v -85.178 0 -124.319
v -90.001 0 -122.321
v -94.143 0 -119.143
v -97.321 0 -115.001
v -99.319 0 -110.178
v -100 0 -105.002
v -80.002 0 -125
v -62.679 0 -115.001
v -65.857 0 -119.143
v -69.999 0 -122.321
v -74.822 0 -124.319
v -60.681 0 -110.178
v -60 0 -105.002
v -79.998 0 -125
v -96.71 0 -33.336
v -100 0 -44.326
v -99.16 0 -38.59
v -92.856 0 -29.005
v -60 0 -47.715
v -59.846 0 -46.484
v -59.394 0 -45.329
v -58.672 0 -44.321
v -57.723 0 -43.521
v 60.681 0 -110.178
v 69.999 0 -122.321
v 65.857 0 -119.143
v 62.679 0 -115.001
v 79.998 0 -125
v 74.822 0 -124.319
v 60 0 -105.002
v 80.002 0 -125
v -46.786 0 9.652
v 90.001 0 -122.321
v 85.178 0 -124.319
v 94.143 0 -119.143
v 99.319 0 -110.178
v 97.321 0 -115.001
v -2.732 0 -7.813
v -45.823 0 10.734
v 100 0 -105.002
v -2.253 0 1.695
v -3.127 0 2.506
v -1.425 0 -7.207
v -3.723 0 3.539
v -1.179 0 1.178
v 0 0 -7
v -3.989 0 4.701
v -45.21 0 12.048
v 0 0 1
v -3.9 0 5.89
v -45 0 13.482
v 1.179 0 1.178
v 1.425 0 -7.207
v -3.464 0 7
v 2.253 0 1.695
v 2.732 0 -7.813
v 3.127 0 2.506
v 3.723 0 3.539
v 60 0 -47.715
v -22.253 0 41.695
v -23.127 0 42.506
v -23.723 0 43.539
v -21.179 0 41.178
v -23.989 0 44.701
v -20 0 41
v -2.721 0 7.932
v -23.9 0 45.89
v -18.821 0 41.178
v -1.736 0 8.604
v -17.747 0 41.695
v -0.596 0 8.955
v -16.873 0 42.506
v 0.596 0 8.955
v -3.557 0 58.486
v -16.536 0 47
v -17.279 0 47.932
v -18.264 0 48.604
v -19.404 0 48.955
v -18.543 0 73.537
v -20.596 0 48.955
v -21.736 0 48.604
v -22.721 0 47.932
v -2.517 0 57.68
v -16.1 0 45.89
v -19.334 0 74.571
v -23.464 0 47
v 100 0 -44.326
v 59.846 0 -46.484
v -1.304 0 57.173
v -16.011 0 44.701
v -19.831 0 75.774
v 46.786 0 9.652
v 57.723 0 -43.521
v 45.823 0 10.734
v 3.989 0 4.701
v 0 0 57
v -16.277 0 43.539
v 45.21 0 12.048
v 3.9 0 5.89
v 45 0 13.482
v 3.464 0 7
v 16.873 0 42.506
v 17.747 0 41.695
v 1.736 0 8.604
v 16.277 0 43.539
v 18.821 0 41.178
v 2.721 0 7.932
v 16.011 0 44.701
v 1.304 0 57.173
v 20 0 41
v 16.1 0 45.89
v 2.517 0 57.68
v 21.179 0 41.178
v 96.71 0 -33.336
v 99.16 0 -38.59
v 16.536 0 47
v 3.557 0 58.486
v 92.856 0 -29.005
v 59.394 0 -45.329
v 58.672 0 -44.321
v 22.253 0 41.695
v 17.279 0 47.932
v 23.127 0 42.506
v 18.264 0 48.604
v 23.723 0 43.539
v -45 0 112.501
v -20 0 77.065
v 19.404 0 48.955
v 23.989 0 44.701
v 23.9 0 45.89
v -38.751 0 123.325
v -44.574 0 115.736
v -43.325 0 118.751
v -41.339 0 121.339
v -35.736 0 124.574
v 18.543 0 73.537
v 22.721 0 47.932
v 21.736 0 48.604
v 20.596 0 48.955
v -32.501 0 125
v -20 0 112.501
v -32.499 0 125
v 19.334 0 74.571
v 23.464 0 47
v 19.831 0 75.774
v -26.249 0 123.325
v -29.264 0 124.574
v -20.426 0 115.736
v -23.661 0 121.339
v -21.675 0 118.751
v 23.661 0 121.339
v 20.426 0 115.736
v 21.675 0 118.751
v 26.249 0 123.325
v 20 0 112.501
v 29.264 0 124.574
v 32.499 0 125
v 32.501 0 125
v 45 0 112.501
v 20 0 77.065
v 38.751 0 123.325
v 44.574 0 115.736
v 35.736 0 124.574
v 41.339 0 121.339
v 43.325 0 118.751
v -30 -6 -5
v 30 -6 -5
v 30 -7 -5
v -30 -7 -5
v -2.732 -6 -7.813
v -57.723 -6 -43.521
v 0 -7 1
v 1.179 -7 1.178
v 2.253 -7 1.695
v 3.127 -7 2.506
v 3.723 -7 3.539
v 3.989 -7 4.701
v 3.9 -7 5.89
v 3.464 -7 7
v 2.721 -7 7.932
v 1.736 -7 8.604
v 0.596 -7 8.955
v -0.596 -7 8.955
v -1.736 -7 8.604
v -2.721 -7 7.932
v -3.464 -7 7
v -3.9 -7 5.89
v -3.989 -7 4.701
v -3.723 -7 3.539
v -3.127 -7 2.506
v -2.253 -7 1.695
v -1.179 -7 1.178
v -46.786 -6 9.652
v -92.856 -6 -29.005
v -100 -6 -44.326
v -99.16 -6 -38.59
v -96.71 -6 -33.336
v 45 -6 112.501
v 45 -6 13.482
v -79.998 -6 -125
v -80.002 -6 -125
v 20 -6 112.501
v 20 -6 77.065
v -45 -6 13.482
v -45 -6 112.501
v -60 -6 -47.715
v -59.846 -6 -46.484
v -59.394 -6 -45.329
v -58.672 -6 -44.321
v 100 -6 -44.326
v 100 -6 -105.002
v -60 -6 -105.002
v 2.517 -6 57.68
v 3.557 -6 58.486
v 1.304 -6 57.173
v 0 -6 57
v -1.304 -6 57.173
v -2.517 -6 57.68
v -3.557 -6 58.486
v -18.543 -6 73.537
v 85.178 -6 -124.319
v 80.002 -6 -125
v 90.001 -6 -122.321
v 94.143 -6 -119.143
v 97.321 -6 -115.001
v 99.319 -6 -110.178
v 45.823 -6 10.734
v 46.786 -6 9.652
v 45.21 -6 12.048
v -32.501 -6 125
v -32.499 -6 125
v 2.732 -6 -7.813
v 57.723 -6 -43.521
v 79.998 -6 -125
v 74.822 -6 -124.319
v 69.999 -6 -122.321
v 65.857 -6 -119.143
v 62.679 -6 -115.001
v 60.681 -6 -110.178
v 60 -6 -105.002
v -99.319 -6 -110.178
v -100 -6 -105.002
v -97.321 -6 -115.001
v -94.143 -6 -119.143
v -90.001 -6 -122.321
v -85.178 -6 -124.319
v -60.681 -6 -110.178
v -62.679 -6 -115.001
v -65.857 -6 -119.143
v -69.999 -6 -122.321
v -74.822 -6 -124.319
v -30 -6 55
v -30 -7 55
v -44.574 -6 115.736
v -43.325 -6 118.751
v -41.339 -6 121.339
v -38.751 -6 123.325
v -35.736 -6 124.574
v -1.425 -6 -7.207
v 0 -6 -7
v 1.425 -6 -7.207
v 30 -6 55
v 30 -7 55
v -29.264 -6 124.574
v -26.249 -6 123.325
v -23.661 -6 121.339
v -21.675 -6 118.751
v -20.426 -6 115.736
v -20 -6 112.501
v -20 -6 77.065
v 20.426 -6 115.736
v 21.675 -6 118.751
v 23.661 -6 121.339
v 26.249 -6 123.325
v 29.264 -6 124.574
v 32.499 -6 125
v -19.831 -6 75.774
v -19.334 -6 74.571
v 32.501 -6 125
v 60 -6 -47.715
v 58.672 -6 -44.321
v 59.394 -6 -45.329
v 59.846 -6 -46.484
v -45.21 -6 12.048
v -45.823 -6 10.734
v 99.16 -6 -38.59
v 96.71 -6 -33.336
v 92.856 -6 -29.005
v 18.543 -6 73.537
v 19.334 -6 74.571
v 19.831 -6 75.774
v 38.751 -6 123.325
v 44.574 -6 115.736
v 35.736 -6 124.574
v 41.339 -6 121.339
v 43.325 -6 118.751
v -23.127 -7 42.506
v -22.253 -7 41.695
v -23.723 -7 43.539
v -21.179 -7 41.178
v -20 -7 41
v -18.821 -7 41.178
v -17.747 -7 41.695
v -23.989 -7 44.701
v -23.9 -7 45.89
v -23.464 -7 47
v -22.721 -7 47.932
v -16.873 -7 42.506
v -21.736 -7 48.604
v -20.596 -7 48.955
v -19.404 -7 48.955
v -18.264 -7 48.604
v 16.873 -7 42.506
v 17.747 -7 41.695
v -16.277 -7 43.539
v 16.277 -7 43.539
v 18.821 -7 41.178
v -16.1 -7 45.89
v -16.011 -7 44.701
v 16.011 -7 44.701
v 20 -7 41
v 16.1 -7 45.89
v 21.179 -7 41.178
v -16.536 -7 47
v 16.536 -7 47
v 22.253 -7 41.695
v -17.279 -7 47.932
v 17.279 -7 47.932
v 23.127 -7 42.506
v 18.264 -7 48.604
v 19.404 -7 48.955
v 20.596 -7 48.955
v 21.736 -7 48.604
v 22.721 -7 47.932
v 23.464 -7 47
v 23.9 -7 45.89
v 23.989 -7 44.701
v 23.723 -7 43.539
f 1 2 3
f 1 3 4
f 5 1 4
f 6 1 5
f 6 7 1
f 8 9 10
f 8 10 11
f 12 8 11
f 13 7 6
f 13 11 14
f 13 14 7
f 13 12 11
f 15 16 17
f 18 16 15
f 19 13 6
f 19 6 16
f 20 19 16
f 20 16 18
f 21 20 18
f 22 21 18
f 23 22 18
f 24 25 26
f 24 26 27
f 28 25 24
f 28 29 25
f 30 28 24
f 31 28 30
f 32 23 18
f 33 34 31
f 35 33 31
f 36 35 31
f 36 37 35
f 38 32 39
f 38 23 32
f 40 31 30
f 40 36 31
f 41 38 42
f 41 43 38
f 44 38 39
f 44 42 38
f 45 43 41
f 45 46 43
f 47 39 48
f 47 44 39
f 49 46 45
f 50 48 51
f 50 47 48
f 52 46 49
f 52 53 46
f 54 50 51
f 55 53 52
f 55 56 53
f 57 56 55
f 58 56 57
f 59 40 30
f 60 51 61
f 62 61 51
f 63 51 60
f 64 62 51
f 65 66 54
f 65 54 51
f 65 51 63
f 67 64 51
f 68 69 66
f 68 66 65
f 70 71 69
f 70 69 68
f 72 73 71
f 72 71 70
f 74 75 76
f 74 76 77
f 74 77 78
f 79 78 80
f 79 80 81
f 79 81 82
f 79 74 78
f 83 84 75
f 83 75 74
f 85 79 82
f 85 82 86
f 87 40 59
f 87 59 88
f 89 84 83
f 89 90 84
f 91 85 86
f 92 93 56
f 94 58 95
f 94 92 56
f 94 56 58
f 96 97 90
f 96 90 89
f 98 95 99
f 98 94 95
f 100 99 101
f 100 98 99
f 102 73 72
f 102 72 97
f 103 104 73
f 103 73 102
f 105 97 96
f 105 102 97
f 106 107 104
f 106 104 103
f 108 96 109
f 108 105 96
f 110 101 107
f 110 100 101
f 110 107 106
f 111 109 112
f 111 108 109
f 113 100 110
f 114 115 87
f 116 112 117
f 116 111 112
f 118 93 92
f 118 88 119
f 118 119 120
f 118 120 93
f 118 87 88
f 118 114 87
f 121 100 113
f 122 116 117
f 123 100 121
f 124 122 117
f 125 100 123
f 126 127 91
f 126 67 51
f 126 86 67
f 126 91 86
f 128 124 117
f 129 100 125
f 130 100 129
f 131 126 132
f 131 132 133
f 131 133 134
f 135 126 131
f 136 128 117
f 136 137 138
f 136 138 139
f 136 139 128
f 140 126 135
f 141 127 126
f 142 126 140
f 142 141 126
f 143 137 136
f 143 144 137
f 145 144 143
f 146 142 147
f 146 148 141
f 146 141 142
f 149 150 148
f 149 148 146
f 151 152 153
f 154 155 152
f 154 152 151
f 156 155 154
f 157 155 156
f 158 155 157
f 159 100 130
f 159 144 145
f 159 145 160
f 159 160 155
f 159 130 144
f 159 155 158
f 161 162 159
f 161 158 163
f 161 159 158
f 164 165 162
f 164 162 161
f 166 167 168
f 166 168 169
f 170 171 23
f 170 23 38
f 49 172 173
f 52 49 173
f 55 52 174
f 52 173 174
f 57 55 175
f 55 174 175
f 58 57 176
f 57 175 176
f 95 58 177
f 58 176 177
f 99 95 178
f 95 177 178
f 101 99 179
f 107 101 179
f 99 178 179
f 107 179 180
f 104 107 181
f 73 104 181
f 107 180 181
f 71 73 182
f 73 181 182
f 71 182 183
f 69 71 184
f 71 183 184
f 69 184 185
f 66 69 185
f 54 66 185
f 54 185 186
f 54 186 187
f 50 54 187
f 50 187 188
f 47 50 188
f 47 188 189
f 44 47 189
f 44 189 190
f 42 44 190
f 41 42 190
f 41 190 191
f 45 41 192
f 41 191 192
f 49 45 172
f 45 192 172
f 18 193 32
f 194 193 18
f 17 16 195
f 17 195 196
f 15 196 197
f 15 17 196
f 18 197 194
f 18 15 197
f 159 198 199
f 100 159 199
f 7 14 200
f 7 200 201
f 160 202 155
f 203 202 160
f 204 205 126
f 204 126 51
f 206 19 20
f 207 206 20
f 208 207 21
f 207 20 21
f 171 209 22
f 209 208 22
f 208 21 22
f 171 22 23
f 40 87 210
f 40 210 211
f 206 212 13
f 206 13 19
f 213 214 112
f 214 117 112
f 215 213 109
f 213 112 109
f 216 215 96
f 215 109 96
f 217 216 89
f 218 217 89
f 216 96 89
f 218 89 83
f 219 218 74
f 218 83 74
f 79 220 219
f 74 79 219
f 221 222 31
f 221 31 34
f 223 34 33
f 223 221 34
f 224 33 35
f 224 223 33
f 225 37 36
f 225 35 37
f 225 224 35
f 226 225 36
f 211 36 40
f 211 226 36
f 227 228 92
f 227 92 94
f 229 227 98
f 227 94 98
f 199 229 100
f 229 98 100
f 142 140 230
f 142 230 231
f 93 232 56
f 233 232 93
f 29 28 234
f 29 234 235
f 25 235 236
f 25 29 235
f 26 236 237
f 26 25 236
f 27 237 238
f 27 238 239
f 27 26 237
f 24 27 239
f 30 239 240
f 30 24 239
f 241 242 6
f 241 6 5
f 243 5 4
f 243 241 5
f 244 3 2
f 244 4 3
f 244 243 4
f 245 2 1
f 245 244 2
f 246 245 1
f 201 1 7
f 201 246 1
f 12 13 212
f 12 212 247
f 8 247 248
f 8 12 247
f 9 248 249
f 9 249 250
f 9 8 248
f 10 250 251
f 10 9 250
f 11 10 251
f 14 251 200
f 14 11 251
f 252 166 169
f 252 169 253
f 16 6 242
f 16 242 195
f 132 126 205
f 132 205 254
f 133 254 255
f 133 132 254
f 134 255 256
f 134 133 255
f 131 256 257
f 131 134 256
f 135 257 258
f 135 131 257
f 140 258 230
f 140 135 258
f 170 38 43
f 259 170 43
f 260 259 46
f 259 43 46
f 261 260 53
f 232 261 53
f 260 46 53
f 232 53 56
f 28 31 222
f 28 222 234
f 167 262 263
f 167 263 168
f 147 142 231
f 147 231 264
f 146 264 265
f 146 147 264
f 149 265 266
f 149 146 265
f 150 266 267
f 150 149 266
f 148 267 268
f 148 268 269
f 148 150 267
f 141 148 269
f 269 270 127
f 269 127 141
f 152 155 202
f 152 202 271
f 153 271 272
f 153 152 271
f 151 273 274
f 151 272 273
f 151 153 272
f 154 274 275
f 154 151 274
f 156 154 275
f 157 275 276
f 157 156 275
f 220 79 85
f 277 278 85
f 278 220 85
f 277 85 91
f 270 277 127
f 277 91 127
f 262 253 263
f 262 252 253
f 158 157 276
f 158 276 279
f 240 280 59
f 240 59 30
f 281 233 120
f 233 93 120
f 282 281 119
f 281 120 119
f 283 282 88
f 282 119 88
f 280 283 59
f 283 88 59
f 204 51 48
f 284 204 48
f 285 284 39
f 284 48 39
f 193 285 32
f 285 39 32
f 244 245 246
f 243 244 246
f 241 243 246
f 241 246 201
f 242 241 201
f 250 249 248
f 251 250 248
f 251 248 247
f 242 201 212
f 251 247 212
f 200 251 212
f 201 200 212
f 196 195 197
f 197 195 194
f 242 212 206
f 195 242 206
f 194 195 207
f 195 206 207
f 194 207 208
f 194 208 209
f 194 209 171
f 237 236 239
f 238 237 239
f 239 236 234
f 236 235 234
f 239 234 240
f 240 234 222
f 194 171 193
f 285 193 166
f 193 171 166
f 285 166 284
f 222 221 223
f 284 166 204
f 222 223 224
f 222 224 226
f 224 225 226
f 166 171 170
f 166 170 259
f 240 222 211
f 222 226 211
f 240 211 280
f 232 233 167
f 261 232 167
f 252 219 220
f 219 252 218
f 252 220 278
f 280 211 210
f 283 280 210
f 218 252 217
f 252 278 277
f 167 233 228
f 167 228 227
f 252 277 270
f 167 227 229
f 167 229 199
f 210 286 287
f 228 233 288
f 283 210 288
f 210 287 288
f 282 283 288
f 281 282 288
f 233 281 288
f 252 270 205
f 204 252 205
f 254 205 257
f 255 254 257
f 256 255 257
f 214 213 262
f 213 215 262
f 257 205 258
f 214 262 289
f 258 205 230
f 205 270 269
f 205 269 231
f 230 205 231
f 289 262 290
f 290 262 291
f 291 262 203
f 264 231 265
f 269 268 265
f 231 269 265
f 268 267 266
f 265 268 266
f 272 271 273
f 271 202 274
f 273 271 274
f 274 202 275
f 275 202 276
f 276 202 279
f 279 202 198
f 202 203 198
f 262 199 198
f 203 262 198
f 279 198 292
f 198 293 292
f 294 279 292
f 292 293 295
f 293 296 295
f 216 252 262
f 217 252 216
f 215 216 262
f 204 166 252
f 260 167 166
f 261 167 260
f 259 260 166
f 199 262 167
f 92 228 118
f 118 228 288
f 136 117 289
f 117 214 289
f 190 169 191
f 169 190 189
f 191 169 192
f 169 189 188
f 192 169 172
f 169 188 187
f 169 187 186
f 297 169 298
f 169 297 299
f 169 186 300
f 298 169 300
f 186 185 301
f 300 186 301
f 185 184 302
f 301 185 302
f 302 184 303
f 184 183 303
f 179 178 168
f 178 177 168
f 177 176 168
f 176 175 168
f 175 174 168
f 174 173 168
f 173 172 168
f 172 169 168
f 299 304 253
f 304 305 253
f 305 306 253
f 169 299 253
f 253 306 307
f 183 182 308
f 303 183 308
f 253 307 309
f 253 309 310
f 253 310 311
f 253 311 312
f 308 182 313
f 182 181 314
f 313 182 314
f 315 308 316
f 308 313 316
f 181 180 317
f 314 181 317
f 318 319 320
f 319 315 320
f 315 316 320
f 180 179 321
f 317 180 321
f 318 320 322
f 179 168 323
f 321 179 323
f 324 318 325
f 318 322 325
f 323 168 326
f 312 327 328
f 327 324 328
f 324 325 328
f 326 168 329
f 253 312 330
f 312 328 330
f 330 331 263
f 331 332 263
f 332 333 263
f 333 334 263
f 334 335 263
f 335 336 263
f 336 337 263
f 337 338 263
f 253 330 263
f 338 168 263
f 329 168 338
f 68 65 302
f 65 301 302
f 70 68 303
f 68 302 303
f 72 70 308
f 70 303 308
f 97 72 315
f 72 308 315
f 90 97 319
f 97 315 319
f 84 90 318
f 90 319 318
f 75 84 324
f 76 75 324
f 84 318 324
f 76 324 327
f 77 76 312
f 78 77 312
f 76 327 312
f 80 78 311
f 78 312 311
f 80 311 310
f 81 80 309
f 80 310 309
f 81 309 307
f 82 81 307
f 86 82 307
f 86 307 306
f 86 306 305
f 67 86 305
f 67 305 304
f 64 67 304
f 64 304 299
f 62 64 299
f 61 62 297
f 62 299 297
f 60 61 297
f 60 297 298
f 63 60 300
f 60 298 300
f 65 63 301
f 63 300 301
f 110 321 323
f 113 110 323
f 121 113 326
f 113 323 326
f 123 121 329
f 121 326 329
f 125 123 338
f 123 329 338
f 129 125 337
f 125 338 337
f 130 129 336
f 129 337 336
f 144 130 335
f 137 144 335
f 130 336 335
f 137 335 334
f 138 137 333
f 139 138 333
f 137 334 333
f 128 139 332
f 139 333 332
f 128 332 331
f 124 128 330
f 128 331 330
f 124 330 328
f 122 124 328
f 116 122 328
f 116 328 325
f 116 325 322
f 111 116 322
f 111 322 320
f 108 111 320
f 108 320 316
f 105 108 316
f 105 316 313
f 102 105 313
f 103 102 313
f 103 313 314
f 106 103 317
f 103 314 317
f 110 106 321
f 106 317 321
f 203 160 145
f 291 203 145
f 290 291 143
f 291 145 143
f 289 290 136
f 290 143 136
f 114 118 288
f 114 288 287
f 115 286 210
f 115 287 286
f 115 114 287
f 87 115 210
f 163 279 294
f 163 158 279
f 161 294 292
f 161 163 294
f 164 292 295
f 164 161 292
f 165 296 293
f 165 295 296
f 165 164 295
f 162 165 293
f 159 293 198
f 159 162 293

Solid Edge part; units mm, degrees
sketch "Sketch1" plane through (0, 0, 0) normal (0, -1, 0) x (1, 0, 0)
  line L0 (-100, 125) -> (100, 125)
  line L1 (100, 125) -> (100, -125)
  line L2 (100, -125) -> (-100, -125)
  line L3 (-100, -125) -> (-100, 125)
  dimension "D1" = 250
  dimension "D2" = 200
extrude "Protrusion1" add sketch "Sketch1" along normal blind 6
sketch "Sketch2" plane through (0, -6, 0) normal (0, -1, 0) x (1, 0, 0)
  line L0 (-30, 55) -> (30, 55)
  line L1 (30, 55) -> (30, -5)
  line L2 (30, -5) -> (-30, -5)
  line L3 (-30, -5) -> (-30, 55)
  dimension "D1" = 60
  dimension "D2" = 60
  dimension "D3" = 70
extrude "Ausprägung_2" add sketch "Sketch2" along normal blind 1
sketch "Sketch3" plane through (0, -6, 0) normal (0, -1, 0) x (1, 0, 0)
  line L0 (-60, -45) -> (60, -45)
  line L1 (60, -45) -> (60, -125)
  line L2 (60, -125) -> (-60, -125)
  line L3 (-60, -125) -> (-60, -45)
  dimension "D1" = 40
  dimension "D2" = 80
extrude "Ausschnitt_1" cut sketch "Sketch3" against normal blind 66.675
sketch "Sketch4" plane through (0, -6, 0) normal (0, -1, 0) x (1, 0, 0)
  line L0 (-20, 125) -> (20, 125)
  line L1 (20, 125) -> (20, 75)
  line L2 (20, 75) -> (-20, 75)
  line L3 (-20, 75) -> (-20, 125)
  dimension "D1" = 50
  dimension "D2" = 40
extrude "Ausschnitt_2" cut sketch "Sketch4" against normal blind 63.5
sketch "Sketch5" plane through (0, -6, 0) normal (0, -1, 0) x (1, 0, 0)
  line L0 (-45, 125) -> (-45, 11.1505)
  line L1 (-45, 11.1505) -> (-100, -35)
  line L2 (-100, -35) -> (-100, 125)
  line L3 (-100, 125) -> (-45, 125)
  dimension "D1" = 25
  dimension "D2" = 160
extrude "Ausschnitt_3" cut sketch "Sketch5" against normal blind 66.675
sketch "Sketch6" plane through (0, -6, 0) normal (0, -1, 0) x (1, 0, 0)
  line L0 (45, 125) -> (45, 11.1505)
  line L1 (45, 11.1505) -> (100, -35)
  line L2 (100, -35) -> (100, 125)
  line L3 (100, 125) -> (45, 125)
  dimension "D1" = 25
  dimension "D2" = 160
extrude "Ausschnitt_4" cut sketch "Sketch6" against normal blind 117.475
sketch "Sketch7" plane through (0, 0, 0) normal (0, 1, 0) x (-1, 0, 0)
  circle A0 centre (0, -12) radius 5
  circle A1 centre (0, 62) radius 5
  dimension "D1" = 10
  dimension "D2" = 13
  dimension "D3" = 33
  dimension "D4" = 45
  dimension "D5" = 45
extrude "Ausschnitt_7" cut sketch "Sketch7" against normal blind 127
sketch "Sketch8" plane through (0, -6, 0) normal (0, -1, 0) x (1, 0, 0)
  line L0 (-20, 75) -> (-3.5431, 58.4721)
  line L1 (-3.5431, 58.4721) -> (3.5431, 58.4721)
  line L2 (3.5431, 58.4721) -> (20, 75)
  line L3 (20, 75) -> (-20, 75)
extrude "Ausschnitt_8" cut sketch "Sketch8" against normal blind 400.05
sketch "Sketch9" plane through (0, -6, 0) normal (0, -1, 0) x (1, 0, 0)
  line L0 (-60, -45) -> (-2.7231, -7.8066)
  line L1 (-2.7231, -7.8066) -> (2.7231, -7.8066)
  line L2 (2.7231, -7.8066) -> (60, -45)
  line L3 (60, -45) -> (-60, -45)
extrude "Ausschnitt_9" cut sketch "Sketch9" against normal blind 565.15
hole "Bohrung_4" at (20, -7, 45) direction (0, 1, 0) diameter 8 end up to next
hole "Hole1" at (0, -7, 5) direction (0, 1, 0) diameter 8 end up to next
hole "Hole2" at (-20, -7, 45) direction (0, 1, 0) diameter 8 end up to next
fillet "Verrundung_1" radius 5 6 edges at (-45, -3, 11.1505) (-20, -3, 75) (20, -3, 75) (45, -3, 11.1505) (60, -3, -45) (-60, -3, -45)
fillet "Verrundung_2" radius 12.5 4 edges at (-45, -3, 125) (-20, -3, 125) (20, -3, 125) (45, -3, 125)
fillet "Verrundung_3" radius 20 1 edges at (-100, -3, -35)
fillet "Verrundung_4" radius 20 1 edges at (100, -3, -35)
fillet "Verrundung_5" radius 20 4 edges at (-100, -3, -125) (-60, -3, -125) (60, -3, -125) (100, -3, -125)
properties material "Aluminium, 1060"
